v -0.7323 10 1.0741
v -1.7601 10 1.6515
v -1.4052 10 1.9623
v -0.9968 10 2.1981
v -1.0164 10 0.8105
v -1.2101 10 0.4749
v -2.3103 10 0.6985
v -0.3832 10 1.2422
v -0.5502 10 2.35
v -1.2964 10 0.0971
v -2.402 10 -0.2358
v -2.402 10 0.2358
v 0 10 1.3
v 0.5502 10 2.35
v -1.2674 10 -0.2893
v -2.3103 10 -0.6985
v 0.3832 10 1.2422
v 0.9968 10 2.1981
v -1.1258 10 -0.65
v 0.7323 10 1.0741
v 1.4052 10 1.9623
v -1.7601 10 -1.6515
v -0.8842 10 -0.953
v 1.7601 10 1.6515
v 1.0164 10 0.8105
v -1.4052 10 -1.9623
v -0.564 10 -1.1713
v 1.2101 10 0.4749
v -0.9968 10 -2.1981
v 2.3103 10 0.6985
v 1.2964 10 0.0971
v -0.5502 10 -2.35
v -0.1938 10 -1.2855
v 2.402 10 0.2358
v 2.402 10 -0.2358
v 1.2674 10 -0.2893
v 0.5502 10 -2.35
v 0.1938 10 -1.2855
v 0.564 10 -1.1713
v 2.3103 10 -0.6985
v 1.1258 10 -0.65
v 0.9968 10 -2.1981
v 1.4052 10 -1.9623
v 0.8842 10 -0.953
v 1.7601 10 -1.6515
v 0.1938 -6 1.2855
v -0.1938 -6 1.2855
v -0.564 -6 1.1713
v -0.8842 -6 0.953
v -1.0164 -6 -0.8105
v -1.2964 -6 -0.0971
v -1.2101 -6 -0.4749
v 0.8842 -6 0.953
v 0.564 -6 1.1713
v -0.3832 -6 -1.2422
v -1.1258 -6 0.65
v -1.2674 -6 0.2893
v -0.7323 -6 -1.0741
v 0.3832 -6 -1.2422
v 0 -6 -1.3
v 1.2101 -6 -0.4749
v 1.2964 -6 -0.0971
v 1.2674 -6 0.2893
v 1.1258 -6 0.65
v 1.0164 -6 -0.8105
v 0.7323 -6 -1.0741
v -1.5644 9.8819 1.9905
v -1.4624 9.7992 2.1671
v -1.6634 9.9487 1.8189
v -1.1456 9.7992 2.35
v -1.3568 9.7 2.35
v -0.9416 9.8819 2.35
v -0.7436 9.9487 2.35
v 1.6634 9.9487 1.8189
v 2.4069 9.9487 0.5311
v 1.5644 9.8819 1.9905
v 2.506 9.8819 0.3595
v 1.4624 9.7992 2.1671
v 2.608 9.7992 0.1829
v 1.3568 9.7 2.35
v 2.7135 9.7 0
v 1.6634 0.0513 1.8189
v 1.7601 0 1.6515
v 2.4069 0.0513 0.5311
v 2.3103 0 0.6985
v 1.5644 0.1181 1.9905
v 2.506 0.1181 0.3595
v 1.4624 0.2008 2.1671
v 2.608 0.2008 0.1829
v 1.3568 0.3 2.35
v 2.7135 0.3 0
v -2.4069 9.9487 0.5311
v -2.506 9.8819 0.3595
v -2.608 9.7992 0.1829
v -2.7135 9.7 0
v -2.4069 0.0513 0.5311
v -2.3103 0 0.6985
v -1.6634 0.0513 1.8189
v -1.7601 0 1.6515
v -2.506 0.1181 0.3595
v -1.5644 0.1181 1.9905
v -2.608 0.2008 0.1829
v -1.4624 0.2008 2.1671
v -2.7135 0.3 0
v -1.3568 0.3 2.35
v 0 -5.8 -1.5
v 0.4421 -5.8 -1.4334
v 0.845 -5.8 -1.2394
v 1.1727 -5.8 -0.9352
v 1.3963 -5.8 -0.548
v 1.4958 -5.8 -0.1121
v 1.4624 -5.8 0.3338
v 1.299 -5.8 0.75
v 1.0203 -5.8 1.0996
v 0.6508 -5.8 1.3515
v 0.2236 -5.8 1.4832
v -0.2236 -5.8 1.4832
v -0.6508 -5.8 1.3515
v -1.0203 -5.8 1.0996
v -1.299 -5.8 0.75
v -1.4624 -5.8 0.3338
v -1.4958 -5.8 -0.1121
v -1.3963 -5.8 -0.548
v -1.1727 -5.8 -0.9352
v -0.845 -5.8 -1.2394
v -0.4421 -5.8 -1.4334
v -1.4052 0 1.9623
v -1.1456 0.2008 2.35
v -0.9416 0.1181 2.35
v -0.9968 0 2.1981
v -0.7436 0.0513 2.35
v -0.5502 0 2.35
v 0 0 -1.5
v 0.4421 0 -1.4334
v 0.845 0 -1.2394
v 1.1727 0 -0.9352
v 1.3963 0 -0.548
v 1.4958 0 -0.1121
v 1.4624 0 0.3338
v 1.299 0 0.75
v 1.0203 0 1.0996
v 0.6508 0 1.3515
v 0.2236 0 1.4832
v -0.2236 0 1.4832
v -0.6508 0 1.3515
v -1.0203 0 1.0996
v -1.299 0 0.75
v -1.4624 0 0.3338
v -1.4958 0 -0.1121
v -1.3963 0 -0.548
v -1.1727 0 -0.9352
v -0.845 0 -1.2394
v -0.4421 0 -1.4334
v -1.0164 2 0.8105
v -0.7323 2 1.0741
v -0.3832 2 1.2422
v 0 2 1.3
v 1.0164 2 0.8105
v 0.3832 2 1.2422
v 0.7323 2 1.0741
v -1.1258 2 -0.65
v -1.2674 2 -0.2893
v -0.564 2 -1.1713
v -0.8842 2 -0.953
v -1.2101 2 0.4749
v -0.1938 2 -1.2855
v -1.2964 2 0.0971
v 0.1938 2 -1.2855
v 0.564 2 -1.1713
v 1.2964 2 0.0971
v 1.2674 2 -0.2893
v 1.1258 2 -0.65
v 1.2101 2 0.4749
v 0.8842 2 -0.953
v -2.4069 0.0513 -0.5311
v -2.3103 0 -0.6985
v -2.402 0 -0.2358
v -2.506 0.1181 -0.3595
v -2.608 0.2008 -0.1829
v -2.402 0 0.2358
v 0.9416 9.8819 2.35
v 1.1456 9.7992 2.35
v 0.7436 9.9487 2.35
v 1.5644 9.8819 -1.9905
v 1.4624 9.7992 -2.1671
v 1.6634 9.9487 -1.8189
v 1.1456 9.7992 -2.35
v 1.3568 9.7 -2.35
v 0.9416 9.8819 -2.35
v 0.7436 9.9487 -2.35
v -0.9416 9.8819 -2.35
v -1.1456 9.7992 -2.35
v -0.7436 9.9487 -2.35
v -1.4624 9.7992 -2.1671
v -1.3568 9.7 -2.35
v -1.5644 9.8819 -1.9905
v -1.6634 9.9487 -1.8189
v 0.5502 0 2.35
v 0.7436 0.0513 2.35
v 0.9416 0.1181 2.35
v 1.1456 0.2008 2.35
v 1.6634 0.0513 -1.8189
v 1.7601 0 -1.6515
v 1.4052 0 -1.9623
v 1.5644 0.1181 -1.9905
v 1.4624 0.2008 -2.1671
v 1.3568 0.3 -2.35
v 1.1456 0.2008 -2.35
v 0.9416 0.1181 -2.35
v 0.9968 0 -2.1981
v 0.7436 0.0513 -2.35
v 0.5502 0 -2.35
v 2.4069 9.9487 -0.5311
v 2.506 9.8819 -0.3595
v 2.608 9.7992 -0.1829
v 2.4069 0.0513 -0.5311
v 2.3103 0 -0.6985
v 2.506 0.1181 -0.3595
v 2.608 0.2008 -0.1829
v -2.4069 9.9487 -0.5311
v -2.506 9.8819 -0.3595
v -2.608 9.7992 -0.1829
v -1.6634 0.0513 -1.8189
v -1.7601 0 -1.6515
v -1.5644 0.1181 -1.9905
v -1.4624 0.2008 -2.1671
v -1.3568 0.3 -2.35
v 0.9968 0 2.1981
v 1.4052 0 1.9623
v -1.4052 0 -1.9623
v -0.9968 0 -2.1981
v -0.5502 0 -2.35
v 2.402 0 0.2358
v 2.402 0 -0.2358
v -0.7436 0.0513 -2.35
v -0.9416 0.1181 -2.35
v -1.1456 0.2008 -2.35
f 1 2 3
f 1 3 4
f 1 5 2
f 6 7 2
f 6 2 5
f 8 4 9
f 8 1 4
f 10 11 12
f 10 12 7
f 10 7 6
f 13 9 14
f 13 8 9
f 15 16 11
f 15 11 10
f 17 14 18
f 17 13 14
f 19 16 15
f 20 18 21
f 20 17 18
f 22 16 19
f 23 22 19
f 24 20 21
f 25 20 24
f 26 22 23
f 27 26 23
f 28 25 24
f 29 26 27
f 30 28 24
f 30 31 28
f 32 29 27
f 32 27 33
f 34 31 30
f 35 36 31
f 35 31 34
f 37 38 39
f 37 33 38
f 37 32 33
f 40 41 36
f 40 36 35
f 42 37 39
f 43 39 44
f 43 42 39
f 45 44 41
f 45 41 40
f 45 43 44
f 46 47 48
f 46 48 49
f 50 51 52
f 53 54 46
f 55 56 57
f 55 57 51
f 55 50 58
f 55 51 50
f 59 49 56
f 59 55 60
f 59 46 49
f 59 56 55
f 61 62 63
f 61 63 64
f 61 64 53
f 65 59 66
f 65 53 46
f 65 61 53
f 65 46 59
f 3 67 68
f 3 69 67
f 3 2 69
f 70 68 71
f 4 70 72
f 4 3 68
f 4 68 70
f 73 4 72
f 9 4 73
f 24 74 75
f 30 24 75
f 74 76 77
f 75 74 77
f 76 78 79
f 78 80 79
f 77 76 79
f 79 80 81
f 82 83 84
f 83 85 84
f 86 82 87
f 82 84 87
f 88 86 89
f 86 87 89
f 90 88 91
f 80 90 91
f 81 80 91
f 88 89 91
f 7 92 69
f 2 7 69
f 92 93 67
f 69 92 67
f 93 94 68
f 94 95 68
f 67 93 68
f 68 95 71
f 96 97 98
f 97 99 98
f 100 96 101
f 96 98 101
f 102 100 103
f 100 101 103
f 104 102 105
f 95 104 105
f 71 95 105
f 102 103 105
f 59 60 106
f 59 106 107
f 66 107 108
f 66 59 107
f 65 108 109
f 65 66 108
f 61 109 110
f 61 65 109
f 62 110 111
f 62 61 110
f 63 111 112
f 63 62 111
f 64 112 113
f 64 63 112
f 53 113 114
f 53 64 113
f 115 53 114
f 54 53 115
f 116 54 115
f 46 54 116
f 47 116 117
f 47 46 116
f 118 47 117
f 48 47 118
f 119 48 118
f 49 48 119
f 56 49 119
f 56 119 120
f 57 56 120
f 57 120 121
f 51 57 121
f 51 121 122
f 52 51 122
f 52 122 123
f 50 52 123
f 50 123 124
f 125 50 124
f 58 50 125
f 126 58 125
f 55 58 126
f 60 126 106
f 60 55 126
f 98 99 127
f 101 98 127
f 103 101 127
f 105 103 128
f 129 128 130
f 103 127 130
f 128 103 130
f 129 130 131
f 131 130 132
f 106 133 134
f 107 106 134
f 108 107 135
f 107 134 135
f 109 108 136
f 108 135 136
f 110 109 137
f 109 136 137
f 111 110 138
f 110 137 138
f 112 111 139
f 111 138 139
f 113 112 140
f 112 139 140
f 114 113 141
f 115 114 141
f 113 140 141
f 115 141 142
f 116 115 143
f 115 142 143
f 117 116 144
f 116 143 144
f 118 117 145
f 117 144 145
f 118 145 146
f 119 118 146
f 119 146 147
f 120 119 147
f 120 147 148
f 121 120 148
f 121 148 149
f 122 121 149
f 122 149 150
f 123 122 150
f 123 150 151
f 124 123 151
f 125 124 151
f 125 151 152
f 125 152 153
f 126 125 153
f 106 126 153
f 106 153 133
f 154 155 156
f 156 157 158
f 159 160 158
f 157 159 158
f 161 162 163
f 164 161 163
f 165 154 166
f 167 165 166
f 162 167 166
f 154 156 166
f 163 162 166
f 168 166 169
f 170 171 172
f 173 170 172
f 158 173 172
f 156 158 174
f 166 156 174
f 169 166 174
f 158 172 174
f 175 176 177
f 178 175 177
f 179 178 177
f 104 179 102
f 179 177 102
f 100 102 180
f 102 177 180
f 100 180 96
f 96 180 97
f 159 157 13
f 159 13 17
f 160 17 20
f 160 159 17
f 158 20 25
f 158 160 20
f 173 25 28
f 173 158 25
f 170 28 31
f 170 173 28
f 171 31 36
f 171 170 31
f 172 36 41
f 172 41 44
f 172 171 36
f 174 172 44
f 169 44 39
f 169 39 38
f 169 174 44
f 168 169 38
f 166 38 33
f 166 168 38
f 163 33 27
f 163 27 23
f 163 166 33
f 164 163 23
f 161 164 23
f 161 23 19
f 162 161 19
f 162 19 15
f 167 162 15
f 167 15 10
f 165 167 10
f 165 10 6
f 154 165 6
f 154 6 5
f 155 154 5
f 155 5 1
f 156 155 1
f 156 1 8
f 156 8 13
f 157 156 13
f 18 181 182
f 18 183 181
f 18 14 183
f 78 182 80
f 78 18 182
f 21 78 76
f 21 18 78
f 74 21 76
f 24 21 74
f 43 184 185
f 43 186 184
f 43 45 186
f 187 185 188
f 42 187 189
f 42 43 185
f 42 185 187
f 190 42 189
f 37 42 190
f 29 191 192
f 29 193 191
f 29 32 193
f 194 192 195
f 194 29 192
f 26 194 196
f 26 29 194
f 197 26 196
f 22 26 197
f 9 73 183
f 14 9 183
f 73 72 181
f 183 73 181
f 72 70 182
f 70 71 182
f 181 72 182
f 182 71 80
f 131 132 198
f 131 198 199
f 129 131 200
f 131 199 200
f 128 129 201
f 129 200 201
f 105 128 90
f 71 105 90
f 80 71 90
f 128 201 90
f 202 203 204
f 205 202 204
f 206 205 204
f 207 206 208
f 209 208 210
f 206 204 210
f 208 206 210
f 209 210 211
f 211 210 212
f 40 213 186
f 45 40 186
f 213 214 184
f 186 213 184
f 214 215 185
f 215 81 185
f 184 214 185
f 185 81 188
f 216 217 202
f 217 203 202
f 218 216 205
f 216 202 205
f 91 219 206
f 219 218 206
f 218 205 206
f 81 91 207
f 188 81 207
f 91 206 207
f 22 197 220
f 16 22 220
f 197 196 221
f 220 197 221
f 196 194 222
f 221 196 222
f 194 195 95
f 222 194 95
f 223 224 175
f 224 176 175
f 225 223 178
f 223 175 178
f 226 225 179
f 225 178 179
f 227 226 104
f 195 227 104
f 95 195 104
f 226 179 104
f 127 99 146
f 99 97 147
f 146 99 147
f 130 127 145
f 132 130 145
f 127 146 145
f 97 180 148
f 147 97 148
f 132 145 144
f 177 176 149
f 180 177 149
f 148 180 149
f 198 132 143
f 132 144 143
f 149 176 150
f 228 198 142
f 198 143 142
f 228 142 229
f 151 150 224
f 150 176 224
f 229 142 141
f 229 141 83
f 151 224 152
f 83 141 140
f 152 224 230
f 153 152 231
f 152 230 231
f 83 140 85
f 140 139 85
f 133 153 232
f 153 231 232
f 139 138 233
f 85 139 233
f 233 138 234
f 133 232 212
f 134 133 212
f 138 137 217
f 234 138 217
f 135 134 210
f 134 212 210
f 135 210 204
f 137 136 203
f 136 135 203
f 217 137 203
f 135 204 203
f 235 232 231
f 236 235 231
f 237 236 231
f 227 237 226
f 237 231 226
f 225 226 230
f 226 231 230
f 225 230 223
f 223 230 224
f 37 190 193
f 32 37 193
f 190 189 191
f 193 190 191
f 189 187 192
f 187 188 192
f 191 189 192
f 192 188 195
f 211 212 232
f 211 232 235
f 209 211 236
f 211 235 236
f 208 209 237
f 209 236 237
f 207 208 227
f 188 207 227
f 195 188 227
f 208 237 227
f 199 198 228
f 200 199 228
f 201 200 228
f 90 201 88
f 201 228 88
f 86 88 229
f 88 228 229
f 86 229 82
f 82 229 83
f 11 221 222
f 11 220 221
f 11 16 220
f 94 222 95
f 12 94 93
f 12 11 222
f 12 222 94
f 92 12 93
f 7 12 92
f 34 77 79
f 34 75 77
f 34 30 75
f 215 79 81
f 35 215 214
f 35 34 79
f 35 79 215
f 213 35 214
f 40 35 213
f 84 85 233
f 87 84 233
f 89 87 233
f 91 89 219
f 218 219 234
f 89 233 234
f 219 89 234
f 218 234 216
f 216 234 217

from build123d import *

# Parameters (mm, degrees)
SKETCH1_R                = 1.3
BOSS_EXTRUDE1_DEPTH      = 10
BOSS_EXTRUDE2_DEPTH      = 6
BOSS_EXTRUDE2_DEPTH_BACK = 2
SKETCH2_R                = 1.5
CHAMFER1_SIZE            = 0.2


with BuildPart() as part:
    # Sketch1 → Boss-Extrude1 (new body)
    with BuildSketch(Plane(origin=(0, 0, 0), x_dir=(1, 0, 0), z_dir=(0, 1, 0))):
        Polygon((-2.713546265, 0), (-1.356773133, -2.35), (1.356773133, -2.35), (2.713546265, 0), (1.356773133, 2.35), (-1.356773133, 2.35), align=None)
        with Locations(Location((0, 0, 0), (0, 0, 270))):
            Circle(SKETCH1_R, mode=Mode.SUBTRACT)
    extrude(amount=BOSS_EXTRUDE1_DEPTH)

    # Sketch2 → Boss-Extrude2 (add, two sides: drawn at the far end of the back side and taken through both)
    with BuildSketch(Plane.XZ.offset(-BOSS_EXTRUDE2_DEPTH_BACK)):
        with Locations(Location((0, 0, 0), (0, 0, 270))):
            Circle(SKETCH2_R)
    extrude(amount=BOSS_EXTRUDE2_DEPTH + BOSS_EXTRUDE2_DEPTH_BACK)

    # Chamfer1
    chamfer1_edges = [part.edges().sort_by_distance(p)[0] for p in [
        (0, -6, 1.5),
    ]]
    chamfer(chamfer1_edges, length=CHAMFER1_SIZE)

    # Sketch6 → Cut-Revolve1 (revolve, cut)
    with BuildSketch(Plane.XY, mode=Mode.PRIVATE) as cut_revolve1_sk:
        Polygon((-2.713546265, 10), (-2.713546265, 9.7), (-2.413546265, 10), align=None)
        Polygon((-2.413546265, 0), (-2.713546265, 0), (-2.713546265, 0.3), align=None)
    revolve(cut_revolve1_sk.sketch.rotate(Axis((0, 0, 0), (0, 1, 0)), 270), axis=Axis((0, 0, 0), (0, 1, 0)), mode=Mode.SUBTRACT)


solid = part.part
